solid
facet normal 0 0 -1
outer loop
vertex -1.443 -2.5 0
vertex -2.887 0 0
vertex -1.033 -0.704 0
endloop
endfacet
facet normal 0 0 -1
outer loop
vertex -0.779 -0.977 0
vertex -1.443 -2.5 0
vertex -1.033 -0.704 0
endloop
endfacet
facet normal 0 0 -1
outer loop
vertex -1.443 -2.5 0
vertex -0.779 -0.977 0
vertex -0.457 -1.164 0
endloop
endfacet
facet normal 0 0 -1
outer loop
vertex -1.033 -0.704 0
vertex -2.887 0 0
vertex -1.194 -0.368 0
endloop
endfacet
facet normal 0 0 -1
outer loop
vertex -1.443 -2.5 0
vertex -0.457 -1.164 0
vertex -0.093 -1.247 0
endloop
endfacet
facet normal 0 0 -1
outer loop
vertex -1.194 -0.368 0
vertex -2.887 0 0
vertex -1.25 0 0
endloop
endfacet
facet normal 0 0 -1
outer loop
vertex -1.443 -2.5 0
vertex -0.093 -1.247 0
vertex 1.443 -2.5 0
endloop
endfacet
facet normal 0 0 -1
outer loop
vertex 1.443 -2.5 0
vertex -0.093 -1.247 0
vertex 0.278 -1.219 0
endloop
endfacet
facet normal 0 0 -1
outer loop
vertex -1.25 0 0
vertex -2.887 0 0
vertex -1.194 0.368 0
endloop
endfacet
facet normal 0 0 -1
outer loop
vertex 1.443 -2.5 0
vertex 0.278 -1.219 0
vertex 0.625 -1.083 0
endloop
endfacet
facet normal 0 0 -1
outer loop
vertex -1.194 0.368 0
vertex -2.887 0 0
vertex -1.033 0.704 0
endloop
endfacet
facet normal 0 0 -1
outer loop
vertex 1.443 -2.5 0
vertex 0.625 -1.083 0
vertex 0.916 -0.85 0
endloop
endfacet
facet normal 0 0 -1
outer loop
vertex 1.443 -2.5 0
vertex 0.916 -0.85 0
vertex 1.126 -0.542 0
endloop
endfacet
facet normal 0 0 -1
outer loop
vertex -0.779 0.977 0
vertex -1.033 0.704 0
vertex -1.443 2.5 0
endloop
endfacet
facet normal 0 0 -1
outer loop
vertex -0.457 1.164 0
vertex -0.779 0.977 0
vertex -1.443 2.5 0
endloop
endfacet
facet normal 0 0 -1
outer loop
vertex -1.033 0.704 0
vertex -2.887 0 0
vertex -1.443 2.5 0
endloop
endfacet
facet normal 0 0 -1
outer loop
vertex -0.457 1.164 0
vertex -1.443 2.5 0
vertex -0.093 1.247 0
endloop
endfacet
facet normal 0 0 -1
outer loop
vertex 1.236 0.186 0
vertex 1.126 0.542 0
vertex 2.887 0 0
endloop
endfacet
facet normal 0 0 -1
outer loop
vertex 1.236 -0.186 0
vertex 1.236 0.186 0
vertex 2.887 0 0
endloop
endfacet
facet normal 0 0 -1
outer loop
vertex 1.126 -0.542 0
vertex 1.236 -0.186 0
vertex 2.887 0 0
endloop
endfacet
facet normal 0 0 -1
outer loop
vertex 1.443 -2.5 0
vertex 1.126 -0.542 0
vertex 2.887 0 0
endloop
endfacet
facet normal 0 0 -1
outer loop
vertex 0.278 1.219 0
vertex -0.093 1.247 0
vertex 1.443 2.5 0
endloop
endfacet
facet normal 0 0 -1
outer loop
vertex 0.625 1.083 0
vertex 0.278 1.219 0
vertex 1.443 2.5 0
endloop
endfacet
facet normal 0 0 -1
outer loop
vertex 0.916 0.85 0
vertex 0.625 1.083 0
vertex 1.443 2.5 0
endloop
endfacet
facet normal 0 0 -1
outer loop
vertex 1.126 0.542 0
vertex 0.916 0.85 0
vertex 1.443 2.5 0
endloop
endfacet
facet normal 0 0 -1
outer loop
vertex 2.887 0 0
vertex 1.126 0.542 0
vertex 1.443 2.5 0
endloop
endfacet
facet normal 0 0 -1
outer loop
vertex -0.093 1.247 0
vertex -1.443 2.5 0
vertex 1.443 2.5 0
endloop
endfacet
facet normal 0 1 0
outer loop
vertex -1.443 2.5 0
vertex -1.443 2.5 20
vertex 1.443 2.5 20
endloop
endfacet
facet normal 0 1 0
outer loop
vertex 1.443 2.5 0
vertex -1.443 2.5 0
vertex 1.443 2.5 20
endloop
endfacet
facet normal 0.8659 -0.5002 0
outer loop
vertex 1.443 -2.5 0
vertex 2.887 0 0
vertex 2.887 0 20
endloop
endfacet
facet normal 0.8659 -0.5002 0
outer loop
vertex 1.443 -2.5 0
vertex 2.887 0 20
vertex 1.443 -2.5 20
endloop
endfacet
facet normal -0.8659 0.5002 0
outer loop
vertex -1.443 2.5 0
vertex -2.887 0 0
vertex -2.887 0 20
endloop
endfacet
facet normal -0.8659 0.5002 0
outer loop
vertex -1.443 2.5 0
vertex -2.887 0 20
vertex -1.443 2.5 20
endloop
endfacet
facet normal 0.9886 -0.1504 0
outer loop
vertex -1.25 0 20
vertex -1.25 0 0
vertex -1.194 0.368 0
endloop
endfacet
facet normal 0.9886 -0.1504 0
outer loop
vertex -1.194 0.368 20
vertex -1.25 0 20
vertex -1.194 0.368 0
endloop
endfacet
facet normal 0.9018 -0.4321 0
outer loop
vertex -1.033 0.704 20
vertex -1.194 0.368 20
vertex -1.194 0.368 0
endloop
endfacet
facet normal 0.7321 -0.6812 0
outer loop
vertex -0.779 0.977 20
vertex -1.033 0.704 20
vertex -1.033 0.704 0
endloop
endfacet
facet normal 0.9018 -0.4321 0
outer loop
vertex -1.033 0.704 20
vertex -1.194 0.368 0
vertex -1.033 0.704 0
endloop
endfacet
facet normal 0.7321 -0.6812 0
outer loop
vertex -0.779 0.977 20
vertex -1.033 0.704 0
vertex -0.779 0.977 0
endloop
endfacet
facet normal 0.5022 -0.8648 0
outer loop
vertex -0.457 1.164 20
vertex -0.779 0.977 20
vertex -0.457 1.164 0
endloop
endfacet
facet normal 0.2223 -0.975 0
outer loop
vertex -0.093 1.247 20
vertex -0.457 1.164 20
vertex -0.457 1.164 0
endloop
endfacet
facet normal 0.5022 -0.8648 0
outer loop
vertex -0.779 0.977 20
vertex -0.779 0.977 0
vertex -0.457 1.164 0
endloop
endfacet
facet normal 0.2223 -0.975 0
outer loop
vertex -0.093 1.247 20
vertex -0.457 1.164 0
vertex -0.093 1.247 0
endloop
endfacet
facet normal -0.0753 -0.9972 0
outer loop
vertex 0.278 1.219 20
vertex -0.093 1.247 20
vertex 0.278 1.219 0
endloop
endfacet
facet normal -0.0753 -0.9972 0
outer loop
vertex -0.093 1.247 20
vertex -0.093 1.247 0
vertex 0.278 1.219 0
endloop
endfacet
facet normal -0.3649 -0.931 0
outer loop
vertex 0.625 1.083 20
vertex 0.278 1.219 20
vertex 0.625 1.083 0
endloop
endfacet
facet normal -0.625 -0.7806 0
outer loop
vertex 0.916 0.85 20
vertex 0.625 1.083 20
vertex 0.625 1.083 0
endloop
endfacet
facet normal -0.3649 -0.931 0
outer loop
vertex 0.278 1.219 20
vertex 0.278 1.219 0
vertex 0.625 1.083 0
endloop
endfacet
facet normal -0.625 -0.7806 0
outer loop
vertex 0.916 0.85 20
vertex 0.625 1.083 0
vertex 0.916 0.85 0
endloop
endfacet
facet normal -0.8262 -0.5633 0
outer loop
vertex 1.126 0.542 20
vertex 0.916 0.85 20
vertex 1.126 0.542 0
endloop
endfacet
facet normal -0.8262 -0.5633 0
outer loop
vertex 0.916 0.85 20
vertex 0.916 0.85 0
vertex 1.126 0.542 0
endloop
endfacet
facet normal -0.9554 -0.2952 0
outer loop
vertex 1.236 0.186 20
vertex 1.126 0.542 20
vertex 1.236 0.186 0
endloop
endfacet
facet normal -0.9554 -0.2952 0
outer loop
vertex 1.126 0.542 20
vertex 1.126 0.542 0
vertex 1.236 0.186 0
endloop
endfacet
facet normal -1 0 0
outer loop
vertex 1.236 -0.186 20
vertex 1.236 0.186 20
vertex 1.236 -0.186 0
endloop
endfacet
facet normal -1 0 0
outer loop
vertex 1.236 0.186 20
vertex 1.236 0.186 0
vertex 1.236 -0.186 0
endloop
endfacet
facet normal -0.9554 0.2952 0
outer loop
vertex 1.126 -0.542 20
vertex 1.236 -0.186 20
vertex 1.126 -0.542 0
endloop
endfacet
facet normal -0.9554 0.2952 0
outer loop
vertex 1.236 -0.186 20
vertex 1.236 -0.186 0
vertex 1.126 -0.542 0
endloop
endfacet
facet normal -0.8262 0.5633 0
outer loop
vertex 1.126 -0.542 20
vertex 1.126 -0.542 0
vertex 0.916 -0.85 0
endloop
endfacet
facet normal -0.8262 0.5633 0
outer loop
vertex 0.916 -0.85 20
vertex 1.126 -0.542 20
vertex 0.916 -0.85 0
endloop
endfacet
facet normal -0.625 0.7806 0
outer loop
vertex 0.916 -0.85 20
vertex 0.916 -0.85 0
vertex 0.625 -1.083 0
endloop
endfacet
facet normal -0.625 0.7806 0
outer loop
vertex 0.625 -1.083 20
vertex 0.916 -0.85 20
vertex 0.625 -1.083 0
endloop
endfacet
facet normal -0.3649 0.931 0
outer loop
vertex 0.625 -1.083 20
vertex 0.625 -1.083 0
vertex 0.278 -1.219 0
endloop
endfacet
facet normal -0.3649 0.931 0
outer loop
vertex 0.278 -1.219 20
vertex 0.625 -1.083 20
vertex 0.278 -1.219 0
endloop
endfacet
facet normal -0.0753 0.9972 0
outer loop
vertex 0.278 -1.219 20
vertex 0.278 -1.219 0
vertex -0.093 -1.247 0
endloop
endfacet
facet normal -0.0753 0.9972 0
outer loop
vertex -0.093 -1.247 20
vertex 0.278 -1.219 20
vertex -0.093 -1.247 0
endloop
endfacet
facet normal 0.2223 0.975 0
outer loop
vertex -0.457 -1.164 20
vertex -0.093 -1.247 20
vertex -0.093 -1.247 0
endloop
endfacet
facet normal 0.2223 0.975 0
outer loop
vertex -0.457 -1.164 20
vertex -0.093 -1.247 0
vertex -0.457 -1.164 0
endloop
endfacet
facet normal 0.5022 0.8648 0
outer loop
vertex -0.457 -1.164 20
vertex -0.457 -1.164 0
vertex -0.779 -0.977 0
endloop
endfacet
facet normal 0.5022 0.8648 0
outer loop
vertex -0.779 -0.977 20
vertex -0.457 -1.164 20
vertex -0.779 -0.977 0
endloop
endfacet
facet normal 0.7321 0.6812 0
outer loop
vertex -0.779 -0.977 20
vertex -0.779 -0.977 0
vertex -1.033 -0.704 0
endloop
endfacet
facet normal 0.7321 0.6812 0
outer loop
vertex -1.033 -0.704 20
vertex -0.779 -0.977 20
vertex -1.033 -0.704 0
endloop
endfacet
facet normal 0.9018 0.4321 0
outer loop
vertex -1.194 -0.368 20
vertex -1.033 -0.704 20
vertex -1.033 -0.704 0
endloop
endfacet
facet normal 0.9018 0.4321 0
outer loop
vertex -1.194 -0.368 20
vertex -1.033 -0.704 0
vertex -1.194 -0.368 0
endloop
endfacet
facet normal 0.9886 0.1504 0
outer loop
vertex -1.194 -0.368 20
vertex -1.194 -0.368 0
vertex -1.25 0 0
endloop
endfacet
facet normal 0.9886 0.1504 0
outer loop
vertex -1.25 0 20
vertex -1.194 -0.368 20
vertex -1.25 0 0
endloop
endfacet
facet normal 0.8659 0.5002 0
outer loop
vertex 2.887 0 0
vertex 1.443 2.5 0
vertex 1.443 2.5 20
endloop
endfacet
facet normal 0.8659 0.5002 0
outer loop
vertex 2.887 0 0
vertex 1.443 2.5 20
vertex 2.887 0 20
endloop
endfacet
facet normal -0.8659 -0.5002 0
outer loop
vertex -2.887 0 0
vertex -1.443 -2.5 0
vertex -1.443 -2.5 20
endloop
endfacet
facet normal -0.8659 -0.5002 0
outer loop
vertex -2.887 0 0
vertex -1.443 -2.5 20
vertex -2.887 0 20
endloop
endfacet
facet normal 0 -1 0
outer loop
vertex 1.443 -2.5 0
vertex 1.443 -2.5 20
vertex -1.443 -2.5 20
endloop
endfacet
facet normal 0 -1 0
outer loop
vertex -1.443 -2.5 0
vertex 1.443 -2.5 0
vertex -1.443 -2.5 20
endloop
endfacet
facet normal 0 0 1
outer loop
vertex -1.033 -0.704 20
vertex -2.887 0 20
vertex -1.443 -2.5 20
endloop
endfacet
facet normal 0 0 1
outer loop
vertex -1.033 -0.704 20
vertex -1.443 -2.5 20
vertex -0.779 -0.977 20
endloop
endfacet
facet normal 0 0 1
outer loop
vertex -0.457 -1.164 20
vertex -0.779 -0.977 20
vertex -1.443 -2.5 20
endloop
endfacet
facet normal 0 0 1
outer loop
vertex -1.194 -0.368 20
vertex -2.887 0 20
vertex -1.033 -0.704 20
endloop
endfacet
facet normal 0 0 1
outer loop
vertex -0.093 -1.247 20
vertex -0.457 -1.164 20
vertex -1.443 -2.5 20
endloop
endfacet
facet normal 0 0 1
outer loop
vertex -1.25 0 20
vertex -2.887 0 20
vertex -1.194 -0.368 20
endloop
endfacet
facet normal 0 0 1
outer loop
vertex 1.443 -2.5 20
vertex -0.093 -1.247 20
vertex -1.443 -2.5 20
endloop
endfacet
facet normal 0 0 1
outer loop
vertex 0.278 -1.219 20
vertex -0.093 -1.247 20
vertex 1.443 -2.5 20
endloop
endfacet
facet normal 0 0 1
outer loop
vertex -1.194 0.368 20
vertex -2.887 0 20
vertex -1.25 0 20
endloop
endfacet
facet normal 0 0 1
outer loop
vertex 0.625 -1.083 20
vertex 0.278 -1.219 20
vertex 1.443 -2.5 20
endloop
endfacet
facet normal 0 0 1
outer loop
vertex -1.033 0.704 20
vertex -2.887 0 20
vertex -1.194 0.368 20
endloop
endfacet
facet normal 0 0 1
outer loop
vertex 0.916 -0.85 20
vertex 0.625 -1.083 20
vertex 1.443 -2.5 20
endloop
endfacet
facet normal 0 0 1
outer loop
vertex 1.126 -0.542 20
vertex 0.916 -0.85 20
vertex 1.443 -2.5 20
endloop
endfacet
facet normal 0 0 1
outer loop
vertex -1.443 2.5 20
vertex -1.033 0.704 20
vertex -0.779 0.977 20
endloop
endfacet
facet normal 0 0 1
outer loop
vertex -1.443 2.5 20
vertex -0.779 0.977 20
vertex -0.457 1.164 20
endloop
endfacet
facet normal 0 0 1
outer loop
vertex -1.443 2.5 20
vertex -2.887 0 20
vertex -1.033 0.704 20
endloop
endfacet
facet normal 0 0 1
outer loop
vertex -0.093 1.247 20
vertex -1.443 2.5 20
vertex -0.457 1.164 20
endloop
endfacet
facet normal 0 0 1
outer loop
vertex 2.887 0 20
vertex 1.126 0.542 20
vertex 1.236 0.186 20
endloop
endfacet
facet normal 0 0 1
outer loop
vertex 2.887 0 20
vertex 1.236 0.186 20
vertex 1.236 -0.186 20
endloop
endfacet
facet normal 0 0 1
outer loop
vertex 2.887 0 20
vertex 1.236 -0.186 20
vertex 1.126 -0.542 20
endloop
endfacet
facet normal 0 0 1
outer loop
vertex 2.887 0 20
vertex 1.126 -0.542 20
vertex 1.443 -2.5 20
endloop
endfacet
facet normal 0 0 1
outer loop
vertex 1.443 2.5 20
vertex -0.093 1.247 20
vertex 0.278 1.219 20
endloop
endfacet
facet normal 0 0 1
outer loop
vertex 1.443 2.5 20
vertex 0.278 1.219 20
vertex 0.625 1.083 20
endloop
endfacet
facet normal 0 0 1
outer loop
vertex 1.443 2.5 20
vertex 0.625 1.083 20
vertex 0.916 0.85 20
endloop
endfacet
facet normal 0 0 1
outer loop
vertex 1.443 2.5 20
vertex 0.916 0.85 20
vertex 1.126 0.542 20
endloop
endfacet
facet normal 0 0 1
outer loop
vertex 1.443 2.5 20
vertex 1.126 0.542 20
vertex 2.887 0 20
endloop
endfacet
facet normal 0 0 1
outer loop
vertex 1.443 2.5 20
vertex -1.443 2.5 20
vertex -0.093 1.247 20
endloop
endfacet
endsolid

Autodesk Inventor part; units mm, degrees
ref_plane "YZ Plane" through (0, 0, 0) normal (1, 0, 0) x (0, 1, 0)
ref_plane "XZ Plane" through (0, 0, 0) normal (0, 1, 0) x (-1, 0, 0)
ref_plane "XY Plane" through (0, 0, 0) normal (0, 0, 1) x (1, 0, 0)
sketch "Sketch1" plane through (0, 0, 0) normal (0, 0, 1) x (1, 0, 0)
  line L0 (2.8868, 0) -> (1.4434, -2.5)
  line L1 (1.4434, -2.5) -> (-1.4434, -2.5)
  line L2 (-1.4434, -2.5) -> (-2.8868, 0)
  line L3 (-2.8868, 0) -> (-1.4434, 2.5)
  line L4 (-1.4434, 2.5) -> (1.4434, 2.5)
  line L5 (1.4434, 2.5) -> (2.8868, 0)
  point P0 (0, 0)
  point P1 (0, 0)
  dimension "d0" = 5
extrude "Extrusion1" add sketch "Sketch1" along normal blind 20
sketch "Sketch3" plane through (0, 0, 0) normal (0, 0, -1) x (-1, 0, 0)
  circle A0 centre (0, 0) radius 1.25
  dimension "d6" = 2.5
extrude "Extrusion3" cut sketch "Sketch3" against normal through all
properties part number "M2.5x12mm_Standoff_ 971120151"
